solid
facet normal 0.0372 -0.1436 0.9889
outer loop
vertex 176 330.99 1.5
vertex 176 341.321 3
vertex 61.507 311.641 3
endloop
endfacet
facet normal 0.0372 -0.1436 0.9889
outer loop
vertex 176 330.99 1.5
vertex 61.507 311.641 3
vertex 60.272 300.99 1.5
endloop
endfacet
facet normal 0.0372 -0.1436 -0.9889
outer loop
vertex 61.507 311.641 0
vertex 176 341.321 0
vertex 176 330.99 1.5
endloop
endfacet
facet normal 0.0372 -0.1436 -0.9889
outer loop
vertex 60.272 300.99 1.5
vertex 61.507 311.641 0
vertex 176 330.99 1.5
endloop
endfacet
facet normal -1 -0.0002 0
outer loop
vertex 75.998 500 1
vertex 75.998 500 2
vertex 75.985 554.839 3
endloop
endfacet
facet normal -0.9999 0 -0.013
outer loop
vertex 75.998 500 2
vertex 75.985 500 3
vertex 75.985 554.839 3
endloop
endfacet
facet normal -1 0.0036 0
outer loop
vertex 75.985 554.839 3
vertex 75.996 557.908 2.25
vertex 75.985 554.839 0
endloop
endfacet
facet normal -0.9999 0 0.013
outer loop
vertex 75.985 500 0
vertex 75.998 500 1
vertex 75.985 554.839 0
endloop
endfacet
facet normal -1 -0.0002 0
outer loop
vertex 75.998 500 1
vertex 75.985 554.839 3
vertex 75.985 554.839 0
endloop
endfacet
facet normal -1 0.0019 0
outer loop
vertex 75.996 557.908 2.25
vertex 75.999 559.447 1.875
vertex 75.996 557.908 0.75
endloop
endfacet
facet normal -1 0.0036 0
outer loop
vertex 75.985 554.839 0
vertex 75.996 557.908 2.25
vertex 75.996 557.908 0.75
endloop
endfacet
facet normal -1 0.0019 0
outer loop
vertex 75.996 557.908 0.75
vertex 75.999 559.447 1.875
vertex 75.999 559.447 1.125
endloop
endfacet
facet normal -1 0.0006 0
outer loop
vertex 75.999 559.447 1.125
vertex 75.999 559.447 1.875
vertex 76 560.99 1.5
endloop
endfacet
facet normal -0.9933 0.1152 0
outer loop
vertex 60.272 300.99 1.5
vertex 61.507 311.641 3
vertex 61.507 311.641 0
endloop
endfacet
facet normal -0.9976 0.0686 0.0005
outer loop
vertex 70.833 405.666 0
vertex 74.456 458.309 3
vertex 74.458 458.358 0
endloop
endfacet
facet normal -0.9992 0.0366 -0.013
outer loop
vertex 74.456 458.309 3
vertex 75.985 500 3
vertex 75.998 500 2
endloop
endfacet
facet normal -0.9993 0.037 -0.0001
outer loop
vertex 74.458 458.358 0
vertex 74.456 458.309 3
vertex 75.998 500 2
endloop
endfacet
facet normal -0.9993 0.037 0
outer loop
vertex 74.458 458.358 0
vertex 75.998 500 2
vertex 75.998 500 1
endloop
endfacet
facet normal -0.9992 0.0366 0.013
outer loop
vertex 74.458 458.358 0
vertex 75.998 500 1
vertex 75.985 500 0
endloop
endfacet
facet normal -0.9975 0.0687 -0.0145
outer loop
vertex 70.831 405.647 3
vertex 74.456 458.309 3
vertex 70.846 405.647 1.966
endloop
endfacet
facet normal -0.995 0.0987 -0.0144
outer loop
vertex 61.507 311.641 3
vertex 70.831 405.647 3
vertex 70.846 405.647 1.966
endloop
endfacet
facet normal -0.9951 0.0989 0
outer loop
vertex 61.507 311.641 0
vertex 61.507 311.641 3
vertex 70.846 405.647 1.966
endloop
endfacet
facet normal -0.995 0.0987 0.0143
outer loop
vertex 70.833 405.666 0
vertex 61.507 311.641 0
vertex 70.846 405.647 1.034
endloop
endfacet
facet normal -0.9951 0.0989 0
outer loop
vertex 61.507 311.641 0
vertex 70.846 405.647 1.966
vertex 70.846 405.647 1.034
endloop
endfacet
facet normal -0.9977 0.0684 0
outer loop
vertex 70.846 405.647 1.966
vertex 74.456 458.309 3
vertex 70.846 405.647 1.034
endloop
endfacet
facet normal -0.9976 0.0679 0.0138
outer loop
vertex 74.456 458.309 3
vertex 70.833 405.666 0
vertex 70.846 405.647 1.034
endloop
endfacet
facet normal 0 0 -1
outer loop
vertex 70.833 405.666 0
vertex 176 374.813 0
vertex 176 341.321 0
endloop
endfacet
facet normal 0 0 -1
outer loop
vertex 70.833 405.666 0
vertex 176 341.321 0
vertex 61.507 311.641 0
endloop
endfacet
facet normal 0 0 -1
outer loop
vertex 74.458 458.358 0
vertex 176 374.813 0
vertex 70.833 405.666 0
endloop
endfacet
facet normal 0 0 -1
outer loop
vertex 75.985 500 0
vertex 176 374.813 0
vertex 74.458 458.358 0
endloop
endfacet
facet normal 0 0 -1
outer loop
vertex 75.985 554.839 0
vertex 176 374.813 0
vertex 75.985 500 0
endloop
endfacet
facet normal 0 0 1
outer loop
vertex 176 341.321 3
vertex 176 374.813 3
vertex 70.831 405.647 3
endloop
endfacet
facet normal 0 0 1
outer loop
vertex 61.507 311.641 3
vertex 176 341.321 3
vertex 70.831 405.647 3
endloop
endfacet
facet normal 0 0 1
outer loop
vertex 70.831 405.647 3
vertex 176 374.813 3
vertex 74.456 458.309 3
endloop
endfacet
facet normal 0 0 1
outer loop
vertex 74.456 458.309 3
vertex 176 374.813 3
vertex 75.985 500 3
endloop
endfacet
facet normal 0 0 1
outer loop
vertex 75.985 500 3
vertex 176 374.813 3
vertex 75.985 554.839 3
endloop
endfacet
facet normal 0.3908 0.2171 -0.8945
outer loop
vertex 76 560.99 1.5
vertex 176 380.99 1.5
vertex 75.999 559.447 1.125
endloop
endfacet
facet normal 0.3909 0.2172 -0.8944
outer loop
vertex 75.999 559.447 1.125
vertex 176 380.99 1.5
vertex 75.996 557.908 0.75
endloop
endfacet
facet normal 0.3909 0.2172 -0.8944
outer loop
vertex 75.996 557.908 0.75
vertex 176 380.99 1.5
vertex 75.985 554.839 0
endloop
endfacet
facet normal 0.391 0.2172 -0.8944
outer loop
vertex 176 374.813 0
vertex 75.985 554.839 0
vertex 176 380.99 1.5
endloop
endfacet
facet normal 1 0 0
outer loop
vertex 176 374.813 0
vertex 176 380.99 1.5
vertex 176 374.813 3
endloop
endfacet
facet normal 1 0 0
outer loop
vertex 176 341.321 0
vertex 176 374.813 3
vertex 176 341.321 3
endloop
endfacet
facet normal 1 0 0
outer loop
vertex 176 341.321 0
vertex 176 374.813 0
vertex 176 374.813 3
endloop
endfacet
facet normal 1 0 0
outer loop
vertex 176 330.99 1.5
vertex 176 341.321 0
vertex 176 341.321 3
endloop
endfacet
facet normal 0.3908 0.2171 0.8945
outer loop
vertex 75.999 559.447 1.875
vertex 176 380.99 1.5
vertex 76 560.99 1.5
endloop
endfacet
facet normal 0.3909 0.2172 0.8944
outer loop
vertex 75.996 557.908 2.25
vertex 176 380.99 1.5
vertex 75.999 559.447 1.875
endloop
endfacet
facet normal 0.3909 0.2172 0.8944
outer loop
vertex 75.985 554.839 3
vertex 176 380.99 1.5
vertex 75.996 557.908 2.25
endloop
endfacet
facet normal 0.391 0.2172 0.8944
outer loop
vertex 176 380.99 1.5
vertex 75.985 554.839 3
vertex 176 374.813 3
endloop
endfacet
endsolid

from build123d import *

# Parameters (mm, degrees)
BOSS_EXTRUDE1_DEPTH = 3
CHAMFER6_SIZE       = 1.5
CHAMFER6_SIZE_2     = 3
CHAMFER7_SIZE       = 1.5
CHAMFER7_SIZE_2     = 3
CHAMFER8_SIZE       = 10
CHAMFER8_SIZE_2     = 1.5
CHAMFER9_SIZE       = 10
CHAMFER9_SIZE_2     = 1.5


with BuildPart() as part:
    # Sketch1 → Boss-Extrude1 (new body)
    with BuildSketch(Plane.XY):
        Polygon((76, 560.990034), (176, 380.990034), (176, 330.990034), (60.272319057, 300.990034), (0, 300.990034), (0, 560.990034), align=None)
    extrude(amount=BOSS_EXTRUDE1_DEPTH)

    # Sketch2 → Cut-Revolve1 (revolve, cut)
    with BuildSketch(Plane.XY.offset(1.5)):
        with BuildLine():
            Line((76, 500), (76, 585.578863385))
            Line((76, 585.578863385), (0, 585.578863385))
            Line((0, 585.578863385), (0, 0))
            add(Edge.make_bspline(
                [(0, 0), (0.013783816, 0.003488157), (0.04033603, 0.01319051), (0.089619378, 0.042063455), (0.174781236, 0.103253354), (0.279068591, 0.195655925), (0.394476748, 0.312893359), (0.511330855, 0.444471001), (0.661995475, 0.626416713), (0.874340043, 0.905417524), (1.210288344, 1.39310301), (1.747935993, 2.271497179), (2.58108843, 3.81588258), (3.907734136, 6.629844229), (5.990626535, 11.732179856), (8.974782838, 20.21551767), (12.492116493, 31.724489027), (16.281172086, 45.606799288), (21.020860811, 64.651371321), (26.206631662, 87.658368898), (31.746320492, 114.722363422), (37.537896498, 145.854010301), (42.871807206, 177.066921726), (47.80723428, 208.345145014), (52.381191067, 239.678124678), (56.615153522, 271.058803785), (60.519680025, 302.482154914), (63.648418258, 330.011833268), (66.11894295, 353.631593101), (68.030132581, 373.329466343), (69.466784443, 389.09643856), (70.806129018, 404.87199461), (71.886996993, 418.683052253), (72.742662769, 430.526418849), (73.404435972, 440.399441684), (73.901071328, 448.299980017), (74.304775576, 455.214817724), (74.62677953, 461.143160456), (74.877801518, 466.084350078), (75.067577987, 470.037846817), (75.336303636, 476.005510657), (75.563352259, 481.736537174), (75.748085722, 487.230769759), (75.884662604, 492.488061525), (75.940348523, 495.116996281), (75.978043797, 497.370577281), (75.993594118, 498.87307617), (76, 499.624354134), (76, 500)],
                knots=[0, 0, 0, 0, 0, 0.000111673, 0.000223346, 0.000446692, 0.000826683, 0.001206674, 0.00151955, 0.001832426, 0.00268779, 0.00396812, 0.006183448, 0.009942812, 0.016507085, 0.02846832, 0.049586633, 0.080772227, 0.111303184, 0.141834141, 0.204203935, 0.266574069, 0.32894426, 0.39131442, 0.453684463, 0.516054568, 0.578424701, 0.640794795, 0.703164955, 0.734350023, 0.765535092, 0.796720055, 0.827905019, 0.859090157, 0.874682727, 0.890275296, 0.905867787, 0.921460278, 0.929256523, 0.937052769, 0.944849014, 0.95264526, 0.97632263, 0.982241972, 0.988161315, 0.994080657, 0.997040329, 1, 1, 1, 1, 1], degree=4))
        make_face()
    revolve(axis=Axis((0, 0, 1.5), (0, 1, 0)), mode=Mode.SUBTRACT)

    # Chamfer6
    # the kernel refuses this chamfer: 3, 1.5 mm, written as the material it takes off along each edge
    with BuildSketch(Plane(origin=(72.226803743, 567.781787262, 3), x_dir=(0.060245471517658, 0.03346970639869887, -0.9976223042390342), z_dir=(0.4856429311786319, -0.8741572761215379, 0))) as chamfer6_piece_1:
        Polygon((CHAMFER6_SIZE * 0.997622304239, -CHAMFER6_SIZE * 0.0689183436017), (-CHAMFER6_SIZE_2 * 0.0689183436017, -CHAMFER6_SIZE_2 * 0.997622304239), (0, 0), align=None)
    extrude(amount=221.451576062, mode=Mode.SUBTRACT)

    # Chamfer7
    # the kernel refuses this chamfer: 3, 1.5 mm, written as the material it takes off along each edge
    with BuildSketch(Plane(origin=(72.226803743, 567.781787262, 0), x_dir=(0.060245471517658, 0.03346970639869887, 0.9976223042390342), z_dir=(0.4856429311786319, -0.8741572761215379, 0))) as chamfer7_piece_1:
        Polygon((CHAMFER7_SIZE * 0.997622304239, CHAMFER7_SIZE * 0.0689183436017), (-CHAMFER7_SIZE_2 * 0.0689183436017, CHAMFER7_SIZE_2 * 0.997622304239), (0, 0), align=None)
    extrude(amount=221.451576062, mode=Mode.SUBTRACT)

    # Chamfer8
    # the kernel refuses this chamfer: 10, 1.5 mm, written as the material it takes off along each edge
    with BuildSketch(Plane(origin=(201.157802967, 337.511672409, 3), x_dir=(-0.250930852134312, 0.9679881864854557, 0.005707737883485932), z_dir=(-0.9680039545618228, -0.2509349396809314, 0))) as chamfer8_piece_1:
        Polygon((CHAMFER8_SIZE * 0.999983710731, CHAMFER8_SIZE * 0.00570773788349), (-CHAMFER8_SIZE_2 * 0.00570773788349, CHAMFER8_SIZE_2 * 0.999983710731), (0, 0), align=None)
    extrude(amount=171.531620397, mode=Mode.SUBTRACT)

    # Chamfer9
    # the kernel refuses this chamfer: 10, 1.5 mm, written as the material it takes off along each edge
    with BuildSketch(Plane(origin=(201.157802967, 337.511672409, 0), x_dir=(-0.250930852134312, 0.9679881864854557, -0.005707737883485934), z_dir=(-0.9680039545618228, -0.2509349396809314, 0))) as chamfer9_piece_1:
        Polygon((CHAMFER9_SIZE * 0.999983710731, -CHAMFER9_SIZE * 0.00570773788349), (-CHAMFER9_SIZE_2 * 0.00570773788349, -CHAMFER9_SIZE_2 * 0.999983710731), (0, 0), align=None)
    extrude(amount=171.531620397, mode=Mode.SUBTRACT)


solid = part.part
